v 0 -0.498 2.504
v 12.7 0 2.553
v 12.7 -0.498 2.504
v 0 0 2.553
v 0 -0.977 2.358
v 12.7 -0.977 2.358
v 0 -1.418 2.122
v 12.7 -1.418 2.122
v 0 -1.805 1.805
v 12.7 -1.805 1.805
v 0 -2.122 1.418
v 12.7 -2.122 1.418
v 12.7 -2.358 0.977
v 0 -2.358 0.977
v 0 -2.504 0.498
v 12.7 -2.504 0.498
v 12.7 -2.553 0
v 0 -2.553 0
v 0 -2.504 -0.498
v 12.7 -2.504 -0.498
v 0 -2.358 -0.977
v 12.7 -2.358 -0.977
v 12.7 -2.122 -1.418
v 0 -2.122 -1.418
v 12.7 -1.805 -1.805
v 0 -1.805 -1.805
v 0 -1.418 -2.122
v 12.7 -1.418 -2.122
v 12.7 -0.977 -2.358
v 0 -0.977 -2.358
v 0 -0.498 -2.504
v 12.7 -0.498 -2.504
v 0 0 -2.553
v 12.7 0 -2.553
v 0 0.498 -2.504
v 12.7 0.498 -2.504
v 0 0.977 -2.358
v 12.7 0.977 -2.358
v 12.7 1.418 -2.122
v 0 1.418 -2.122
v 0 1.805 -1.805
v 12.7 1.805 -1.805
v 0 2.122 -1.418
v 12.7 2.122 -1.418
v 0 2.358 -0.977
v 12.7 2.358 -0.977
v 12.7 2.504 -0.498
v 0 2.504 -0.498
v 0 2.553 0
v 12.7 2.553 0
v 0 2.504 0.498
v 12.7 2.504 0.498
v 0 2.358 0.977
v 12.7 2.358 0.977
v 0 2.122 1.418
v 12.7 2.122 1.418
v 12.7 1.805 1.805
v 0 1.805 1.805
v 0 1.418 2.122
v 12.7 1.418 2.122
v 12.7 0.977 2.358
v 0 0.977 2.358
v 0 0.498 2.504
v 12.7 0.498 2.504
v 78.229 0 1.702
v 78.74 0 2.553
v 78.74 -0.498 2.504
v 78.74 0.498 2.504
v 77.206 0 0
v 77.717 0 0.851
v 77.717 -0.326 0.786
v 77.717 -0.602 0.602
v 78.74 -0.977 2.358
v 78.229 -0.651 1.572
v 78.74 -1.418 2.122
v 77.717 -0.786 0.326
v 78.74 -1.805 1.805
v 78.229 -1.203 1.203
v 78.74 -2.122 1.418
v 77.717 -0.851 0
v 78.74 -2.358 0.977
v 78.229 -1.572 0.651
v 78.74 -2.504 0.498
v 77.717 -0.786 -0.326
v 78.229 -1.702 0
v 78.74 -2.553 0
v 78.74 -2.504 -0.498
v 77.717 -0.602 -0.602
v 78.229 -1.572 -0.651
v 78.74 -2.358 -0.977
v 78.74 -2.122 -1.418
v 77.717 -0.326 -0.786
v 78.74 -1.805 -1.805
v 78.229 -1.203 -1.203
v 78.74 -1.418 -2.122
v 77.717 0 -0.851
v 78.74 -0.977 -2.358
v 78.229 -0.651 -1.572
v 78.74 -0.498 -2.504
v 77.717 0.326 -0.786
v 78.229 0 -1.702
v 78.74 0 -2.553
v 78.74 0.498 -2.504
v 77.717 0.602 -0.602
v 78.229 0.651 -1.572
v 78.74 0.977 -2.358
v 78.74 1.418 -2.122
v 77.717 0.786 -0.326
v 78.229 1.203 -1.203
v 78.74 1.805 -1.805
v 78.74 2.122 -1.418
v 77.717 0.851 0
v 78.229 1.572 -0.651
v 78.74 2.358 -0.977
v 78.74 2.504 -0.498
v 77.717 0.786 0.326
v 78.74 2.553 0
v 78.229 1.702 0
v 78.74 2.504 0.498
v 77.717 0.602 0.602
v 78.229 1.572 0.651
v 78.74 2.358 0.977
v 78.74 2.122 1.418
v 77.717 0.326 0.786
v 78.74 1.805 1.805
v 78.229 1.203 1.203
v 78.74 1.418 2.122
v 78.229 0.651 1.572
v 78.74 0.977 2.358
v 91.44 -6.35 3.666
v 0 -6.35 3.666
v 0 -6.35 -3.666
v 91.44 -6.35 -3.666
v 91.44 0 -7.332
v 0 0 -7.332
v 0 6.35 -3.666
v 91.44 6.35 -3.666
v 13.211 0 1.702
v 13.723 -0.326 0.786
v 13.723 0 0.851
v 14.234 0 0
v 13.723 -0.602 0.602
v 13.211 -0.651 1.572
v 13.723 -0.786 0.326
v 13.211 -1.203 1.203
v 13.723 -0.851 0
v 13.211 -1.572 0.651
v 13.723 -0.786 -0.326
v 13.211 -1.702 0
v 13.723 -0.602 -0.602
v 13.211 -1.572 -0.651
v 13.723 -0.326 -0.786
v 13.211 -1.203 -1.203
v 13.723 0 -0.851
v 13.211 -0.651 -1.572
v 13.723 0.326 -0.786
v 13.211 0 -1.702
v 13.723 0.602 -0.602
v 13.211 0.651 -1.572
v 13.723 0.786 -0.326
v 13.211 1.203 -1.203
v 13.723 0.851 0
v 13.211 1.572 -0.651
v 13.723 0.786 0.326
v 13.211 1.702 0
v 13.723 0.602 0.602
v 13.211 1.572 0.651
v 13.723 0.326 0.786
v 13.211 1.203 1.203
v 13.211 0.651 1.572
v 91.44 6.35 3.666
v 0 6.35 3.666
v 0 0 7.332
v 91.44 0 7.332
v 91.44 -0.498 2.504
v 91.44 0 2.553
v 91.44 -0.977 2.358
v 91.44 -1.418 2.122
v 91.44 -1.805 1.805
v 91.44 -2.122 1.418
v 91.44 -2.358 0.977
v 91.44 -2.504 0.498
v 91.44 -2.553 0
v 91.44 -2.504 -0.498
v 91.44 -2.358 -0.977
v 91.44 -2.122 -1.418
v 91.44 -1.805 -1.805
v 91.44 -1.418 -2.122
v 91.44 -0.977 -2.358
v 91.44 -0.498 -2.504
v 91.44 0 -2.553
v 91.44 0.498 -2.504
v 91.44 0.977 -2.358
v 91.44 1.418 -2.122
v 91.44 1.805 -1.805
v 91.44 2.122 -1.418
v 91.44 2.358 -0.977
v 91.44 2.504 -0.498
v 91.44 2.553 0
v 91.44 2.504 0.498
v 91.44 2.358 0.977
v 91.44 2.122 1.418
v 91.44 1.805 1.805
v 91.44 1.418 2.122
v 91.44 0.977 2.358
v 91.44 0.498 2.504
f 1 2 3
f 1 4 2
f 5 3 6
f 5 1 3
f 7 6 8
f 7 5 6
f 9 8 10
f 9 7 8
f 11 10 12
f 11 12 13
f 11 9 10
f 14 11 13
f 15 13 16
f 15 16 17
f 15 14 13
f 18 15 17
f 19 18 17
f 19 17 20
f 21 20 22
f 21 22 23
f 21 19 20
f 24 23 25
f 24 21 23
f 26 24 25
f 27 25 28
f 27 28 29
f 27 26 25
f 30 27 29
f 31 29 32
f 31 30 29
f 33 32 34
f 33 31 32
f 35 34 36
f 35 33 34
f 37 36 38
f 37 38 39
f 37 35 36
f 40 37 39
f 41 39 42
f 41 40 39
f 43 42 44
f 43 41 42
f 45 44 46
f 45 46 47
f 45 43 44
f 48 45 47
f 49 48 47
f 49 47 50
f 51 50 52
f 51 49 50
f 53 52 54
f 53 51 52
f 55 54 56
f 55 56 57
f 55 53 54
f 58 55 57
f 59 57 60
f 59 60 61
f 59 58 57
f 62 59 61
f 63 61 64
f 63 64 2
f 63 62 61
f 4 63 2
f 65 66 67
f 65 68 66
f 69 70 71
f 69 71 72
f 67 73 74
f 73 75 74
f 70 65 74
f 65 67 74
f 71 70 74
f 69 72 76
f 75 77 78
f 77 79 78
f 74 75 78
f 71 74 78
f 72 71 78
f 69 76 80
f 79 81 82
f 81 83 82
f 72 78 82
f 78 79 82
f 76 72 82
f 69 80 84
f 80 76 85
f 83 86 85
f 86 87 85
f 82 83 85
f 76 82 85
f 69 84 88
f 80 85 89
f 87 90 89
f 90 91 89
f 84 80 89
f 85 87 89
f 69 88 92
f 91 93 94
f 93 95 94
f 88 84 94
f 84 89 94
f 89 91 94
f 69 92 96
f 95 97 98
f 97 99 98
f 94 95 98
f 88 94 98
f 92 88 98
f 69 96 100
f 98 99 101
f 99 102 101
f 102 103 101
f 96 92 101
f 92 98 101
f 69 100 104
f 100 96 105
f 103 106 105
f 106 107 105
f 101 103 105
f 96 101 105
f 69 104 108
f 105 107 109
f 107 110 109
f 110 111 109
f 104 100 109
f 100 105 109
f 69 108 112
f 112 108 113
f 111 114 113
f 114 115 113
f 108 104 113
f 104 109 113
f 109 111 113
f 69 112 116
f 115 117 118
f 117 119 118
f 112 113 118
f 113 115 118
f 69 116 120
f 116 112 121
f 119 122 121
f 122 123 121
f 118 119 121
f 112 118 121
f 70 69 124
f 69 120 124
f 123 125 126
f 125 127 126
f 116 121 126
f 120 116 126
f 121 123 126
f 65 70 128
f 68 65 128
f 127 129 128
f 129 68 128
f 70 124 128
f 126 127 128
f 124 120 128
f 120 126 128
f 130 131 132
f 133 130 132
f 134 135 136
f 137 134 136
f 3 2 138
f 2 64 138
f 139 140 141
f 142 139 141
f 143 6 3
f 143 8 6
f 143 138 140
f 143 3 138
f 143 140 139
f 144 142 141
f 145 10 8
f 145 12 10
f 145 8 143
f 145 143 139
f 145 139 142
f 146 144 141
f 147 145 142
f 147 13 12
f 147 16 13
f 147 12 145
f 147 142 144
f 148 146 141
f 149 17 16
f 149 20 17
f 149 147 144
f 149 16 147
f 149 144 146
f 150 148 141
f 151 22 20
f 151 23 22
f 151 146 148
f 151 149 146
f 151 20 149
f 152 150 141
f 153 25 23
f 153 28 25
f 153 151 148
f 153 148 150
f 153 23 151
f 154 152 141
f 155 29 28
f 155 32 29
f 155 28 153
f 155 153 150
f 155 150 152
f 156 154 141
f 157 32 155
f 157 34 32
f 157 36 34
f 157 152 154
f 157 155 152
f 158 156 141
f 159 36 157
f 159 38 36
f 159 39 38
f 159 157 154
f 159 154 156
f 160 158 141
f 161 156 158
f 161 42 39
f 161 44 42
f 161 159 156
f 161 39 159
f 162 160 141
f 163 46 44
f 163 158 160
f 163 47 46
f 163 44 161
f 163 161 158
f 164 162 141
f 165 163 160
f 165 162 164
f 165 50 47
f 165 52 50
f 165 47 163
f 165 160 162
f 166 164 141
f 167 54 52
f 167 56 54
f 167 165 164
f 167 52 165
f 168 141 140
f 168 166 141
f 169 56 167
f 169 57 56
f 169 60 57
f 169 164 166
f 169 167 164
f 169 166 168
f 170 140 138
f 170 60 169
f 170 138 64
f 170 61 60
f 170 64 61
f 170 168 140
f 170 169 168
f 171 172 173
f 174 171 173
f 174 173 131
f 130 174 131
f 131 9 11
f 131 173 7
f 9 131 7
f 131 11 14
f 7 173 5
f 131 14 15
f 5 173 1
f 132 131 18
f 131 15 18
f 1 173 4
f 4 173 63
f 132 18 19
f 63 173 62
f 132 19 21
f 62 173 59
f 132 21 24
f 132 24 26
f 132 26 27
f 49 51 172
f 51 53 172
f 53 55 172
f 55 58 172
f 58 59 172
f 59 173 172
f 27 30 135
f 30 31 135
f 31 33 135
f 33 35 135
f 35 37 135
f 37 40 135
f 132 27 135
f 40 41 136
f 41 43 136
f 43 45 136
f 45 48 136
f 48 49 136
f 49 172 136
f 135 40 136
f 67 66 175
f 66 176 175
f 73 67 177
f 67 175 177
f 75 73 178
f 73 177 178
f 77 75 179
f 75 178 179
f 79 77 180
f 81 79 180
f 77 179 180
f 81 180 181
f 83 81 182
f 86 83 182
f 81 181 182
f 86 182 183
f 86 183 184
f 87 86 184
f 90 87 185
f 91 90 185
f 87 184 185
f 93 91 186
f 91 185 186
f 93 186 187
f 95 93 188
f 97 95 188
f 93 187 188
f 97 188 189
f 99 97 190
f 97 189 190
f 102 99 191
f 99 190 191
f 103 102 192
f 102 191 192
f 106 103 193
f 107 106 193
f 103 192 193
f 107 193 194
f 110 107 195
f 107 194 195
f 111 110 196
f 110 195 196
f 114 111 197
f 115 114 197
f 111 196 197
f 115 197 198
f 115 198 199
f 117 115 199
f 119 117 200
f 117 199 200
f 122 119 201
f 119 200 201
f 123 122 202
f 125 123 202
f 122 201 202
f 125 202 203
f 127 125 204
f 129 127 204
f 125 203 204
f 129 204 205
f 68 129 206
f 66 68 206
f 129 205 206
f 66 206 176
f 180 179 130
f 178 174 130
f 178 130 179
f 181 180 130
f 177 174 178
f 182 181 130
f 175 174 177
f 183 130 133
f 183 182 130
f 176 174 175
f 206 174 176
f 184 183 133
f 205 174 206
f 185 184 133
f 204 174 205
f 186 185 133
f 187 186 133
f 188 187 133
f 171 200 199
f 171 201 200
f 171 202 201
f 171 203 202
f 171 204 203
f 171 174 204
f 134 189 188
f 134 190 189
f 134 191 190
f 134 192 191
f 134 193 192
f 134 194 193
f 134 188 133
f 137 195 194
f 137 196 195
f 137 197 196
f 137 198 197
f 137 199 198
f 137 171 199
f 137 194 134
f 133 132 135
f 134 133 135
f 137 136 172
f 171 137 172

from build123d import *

# Parameters (mm, degrees)
BOSS_EXTRUDE1_DEPTH = 91.44


with BuildPart() as part:
    # Sketch1 → Boss-Extrude1 (new body)
    with BuildSketch(Plane(origin=(0, 0, 0), x_dir=(0, 0, -1), z_dir=(1, 0, 0))):
        Polygon((7.332348419, 0), (3.666174209, 6.35), (-3.666174209, 6.35), (-7.332348419, 0), (-3.666174209, -6.35), (3.666174209, -6.35), align=None)
    extrude(amount=BOSS_EXTRUDE1_DEPTH)

    # Sketch3 → Tap Drill for 1/4-20 Tap1 (revolve, cut)
    with BuildSketch(Plane.ZX):
        Polygon((0, 0), (0, 14.233816902), (2.5527, 12.7), (2.5527, 0), align=None)
    tap_drill_for_1_4_20_tap1 = revolve(axis=Axis((-6.35, 0, 0), (1, 0, 0)), mode=Mode.SUBTRACT)

    # Mirror1: Tap Drill for 1/4-20 Tap1 across plane
    add(tap_drill_for_1_4_20_tap1.mirror(Plane.ZY.offset(-45.72)), mode=Mode.SUBTRACT)


solid = part.part
